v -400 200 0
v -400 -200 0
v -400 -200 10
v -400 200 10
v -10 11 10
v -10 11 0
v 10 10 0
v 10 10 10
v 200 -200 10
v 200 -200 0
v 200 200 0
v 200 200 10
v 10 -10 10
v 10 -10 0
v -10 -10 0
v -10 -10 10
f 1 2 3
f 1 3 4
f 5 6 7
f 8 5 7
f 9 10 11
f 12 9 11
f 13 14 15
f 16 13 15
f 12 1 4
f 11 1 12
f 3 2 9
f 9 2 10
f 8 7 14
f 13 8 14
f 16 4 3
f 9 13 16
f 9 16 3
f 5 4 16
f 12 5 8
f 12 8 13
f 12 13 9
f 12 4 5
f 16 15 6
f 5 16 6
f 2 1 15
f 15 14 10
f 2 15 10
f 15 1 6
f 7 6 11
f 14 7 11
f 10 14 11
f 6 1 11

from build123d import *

# Parameters (mm, degrees)
F0_W     = 600
F0_H     = 400
F1_DEPTH = 10


with BuildPart() as f1:
    # F0 (on Top) → F1 (new body)
    with BuildSketch(Plane.XY):
        with Locations((-100, 0)):
            Rectangle(F0_W, F0_H)
        Polygon((-10, -10), (-10, 11), (10, 10), (10, -10), align=None, mode=Mode.SUBTRACT)
    extrude(amount=F1_DEPTH)


solid = f1.part
